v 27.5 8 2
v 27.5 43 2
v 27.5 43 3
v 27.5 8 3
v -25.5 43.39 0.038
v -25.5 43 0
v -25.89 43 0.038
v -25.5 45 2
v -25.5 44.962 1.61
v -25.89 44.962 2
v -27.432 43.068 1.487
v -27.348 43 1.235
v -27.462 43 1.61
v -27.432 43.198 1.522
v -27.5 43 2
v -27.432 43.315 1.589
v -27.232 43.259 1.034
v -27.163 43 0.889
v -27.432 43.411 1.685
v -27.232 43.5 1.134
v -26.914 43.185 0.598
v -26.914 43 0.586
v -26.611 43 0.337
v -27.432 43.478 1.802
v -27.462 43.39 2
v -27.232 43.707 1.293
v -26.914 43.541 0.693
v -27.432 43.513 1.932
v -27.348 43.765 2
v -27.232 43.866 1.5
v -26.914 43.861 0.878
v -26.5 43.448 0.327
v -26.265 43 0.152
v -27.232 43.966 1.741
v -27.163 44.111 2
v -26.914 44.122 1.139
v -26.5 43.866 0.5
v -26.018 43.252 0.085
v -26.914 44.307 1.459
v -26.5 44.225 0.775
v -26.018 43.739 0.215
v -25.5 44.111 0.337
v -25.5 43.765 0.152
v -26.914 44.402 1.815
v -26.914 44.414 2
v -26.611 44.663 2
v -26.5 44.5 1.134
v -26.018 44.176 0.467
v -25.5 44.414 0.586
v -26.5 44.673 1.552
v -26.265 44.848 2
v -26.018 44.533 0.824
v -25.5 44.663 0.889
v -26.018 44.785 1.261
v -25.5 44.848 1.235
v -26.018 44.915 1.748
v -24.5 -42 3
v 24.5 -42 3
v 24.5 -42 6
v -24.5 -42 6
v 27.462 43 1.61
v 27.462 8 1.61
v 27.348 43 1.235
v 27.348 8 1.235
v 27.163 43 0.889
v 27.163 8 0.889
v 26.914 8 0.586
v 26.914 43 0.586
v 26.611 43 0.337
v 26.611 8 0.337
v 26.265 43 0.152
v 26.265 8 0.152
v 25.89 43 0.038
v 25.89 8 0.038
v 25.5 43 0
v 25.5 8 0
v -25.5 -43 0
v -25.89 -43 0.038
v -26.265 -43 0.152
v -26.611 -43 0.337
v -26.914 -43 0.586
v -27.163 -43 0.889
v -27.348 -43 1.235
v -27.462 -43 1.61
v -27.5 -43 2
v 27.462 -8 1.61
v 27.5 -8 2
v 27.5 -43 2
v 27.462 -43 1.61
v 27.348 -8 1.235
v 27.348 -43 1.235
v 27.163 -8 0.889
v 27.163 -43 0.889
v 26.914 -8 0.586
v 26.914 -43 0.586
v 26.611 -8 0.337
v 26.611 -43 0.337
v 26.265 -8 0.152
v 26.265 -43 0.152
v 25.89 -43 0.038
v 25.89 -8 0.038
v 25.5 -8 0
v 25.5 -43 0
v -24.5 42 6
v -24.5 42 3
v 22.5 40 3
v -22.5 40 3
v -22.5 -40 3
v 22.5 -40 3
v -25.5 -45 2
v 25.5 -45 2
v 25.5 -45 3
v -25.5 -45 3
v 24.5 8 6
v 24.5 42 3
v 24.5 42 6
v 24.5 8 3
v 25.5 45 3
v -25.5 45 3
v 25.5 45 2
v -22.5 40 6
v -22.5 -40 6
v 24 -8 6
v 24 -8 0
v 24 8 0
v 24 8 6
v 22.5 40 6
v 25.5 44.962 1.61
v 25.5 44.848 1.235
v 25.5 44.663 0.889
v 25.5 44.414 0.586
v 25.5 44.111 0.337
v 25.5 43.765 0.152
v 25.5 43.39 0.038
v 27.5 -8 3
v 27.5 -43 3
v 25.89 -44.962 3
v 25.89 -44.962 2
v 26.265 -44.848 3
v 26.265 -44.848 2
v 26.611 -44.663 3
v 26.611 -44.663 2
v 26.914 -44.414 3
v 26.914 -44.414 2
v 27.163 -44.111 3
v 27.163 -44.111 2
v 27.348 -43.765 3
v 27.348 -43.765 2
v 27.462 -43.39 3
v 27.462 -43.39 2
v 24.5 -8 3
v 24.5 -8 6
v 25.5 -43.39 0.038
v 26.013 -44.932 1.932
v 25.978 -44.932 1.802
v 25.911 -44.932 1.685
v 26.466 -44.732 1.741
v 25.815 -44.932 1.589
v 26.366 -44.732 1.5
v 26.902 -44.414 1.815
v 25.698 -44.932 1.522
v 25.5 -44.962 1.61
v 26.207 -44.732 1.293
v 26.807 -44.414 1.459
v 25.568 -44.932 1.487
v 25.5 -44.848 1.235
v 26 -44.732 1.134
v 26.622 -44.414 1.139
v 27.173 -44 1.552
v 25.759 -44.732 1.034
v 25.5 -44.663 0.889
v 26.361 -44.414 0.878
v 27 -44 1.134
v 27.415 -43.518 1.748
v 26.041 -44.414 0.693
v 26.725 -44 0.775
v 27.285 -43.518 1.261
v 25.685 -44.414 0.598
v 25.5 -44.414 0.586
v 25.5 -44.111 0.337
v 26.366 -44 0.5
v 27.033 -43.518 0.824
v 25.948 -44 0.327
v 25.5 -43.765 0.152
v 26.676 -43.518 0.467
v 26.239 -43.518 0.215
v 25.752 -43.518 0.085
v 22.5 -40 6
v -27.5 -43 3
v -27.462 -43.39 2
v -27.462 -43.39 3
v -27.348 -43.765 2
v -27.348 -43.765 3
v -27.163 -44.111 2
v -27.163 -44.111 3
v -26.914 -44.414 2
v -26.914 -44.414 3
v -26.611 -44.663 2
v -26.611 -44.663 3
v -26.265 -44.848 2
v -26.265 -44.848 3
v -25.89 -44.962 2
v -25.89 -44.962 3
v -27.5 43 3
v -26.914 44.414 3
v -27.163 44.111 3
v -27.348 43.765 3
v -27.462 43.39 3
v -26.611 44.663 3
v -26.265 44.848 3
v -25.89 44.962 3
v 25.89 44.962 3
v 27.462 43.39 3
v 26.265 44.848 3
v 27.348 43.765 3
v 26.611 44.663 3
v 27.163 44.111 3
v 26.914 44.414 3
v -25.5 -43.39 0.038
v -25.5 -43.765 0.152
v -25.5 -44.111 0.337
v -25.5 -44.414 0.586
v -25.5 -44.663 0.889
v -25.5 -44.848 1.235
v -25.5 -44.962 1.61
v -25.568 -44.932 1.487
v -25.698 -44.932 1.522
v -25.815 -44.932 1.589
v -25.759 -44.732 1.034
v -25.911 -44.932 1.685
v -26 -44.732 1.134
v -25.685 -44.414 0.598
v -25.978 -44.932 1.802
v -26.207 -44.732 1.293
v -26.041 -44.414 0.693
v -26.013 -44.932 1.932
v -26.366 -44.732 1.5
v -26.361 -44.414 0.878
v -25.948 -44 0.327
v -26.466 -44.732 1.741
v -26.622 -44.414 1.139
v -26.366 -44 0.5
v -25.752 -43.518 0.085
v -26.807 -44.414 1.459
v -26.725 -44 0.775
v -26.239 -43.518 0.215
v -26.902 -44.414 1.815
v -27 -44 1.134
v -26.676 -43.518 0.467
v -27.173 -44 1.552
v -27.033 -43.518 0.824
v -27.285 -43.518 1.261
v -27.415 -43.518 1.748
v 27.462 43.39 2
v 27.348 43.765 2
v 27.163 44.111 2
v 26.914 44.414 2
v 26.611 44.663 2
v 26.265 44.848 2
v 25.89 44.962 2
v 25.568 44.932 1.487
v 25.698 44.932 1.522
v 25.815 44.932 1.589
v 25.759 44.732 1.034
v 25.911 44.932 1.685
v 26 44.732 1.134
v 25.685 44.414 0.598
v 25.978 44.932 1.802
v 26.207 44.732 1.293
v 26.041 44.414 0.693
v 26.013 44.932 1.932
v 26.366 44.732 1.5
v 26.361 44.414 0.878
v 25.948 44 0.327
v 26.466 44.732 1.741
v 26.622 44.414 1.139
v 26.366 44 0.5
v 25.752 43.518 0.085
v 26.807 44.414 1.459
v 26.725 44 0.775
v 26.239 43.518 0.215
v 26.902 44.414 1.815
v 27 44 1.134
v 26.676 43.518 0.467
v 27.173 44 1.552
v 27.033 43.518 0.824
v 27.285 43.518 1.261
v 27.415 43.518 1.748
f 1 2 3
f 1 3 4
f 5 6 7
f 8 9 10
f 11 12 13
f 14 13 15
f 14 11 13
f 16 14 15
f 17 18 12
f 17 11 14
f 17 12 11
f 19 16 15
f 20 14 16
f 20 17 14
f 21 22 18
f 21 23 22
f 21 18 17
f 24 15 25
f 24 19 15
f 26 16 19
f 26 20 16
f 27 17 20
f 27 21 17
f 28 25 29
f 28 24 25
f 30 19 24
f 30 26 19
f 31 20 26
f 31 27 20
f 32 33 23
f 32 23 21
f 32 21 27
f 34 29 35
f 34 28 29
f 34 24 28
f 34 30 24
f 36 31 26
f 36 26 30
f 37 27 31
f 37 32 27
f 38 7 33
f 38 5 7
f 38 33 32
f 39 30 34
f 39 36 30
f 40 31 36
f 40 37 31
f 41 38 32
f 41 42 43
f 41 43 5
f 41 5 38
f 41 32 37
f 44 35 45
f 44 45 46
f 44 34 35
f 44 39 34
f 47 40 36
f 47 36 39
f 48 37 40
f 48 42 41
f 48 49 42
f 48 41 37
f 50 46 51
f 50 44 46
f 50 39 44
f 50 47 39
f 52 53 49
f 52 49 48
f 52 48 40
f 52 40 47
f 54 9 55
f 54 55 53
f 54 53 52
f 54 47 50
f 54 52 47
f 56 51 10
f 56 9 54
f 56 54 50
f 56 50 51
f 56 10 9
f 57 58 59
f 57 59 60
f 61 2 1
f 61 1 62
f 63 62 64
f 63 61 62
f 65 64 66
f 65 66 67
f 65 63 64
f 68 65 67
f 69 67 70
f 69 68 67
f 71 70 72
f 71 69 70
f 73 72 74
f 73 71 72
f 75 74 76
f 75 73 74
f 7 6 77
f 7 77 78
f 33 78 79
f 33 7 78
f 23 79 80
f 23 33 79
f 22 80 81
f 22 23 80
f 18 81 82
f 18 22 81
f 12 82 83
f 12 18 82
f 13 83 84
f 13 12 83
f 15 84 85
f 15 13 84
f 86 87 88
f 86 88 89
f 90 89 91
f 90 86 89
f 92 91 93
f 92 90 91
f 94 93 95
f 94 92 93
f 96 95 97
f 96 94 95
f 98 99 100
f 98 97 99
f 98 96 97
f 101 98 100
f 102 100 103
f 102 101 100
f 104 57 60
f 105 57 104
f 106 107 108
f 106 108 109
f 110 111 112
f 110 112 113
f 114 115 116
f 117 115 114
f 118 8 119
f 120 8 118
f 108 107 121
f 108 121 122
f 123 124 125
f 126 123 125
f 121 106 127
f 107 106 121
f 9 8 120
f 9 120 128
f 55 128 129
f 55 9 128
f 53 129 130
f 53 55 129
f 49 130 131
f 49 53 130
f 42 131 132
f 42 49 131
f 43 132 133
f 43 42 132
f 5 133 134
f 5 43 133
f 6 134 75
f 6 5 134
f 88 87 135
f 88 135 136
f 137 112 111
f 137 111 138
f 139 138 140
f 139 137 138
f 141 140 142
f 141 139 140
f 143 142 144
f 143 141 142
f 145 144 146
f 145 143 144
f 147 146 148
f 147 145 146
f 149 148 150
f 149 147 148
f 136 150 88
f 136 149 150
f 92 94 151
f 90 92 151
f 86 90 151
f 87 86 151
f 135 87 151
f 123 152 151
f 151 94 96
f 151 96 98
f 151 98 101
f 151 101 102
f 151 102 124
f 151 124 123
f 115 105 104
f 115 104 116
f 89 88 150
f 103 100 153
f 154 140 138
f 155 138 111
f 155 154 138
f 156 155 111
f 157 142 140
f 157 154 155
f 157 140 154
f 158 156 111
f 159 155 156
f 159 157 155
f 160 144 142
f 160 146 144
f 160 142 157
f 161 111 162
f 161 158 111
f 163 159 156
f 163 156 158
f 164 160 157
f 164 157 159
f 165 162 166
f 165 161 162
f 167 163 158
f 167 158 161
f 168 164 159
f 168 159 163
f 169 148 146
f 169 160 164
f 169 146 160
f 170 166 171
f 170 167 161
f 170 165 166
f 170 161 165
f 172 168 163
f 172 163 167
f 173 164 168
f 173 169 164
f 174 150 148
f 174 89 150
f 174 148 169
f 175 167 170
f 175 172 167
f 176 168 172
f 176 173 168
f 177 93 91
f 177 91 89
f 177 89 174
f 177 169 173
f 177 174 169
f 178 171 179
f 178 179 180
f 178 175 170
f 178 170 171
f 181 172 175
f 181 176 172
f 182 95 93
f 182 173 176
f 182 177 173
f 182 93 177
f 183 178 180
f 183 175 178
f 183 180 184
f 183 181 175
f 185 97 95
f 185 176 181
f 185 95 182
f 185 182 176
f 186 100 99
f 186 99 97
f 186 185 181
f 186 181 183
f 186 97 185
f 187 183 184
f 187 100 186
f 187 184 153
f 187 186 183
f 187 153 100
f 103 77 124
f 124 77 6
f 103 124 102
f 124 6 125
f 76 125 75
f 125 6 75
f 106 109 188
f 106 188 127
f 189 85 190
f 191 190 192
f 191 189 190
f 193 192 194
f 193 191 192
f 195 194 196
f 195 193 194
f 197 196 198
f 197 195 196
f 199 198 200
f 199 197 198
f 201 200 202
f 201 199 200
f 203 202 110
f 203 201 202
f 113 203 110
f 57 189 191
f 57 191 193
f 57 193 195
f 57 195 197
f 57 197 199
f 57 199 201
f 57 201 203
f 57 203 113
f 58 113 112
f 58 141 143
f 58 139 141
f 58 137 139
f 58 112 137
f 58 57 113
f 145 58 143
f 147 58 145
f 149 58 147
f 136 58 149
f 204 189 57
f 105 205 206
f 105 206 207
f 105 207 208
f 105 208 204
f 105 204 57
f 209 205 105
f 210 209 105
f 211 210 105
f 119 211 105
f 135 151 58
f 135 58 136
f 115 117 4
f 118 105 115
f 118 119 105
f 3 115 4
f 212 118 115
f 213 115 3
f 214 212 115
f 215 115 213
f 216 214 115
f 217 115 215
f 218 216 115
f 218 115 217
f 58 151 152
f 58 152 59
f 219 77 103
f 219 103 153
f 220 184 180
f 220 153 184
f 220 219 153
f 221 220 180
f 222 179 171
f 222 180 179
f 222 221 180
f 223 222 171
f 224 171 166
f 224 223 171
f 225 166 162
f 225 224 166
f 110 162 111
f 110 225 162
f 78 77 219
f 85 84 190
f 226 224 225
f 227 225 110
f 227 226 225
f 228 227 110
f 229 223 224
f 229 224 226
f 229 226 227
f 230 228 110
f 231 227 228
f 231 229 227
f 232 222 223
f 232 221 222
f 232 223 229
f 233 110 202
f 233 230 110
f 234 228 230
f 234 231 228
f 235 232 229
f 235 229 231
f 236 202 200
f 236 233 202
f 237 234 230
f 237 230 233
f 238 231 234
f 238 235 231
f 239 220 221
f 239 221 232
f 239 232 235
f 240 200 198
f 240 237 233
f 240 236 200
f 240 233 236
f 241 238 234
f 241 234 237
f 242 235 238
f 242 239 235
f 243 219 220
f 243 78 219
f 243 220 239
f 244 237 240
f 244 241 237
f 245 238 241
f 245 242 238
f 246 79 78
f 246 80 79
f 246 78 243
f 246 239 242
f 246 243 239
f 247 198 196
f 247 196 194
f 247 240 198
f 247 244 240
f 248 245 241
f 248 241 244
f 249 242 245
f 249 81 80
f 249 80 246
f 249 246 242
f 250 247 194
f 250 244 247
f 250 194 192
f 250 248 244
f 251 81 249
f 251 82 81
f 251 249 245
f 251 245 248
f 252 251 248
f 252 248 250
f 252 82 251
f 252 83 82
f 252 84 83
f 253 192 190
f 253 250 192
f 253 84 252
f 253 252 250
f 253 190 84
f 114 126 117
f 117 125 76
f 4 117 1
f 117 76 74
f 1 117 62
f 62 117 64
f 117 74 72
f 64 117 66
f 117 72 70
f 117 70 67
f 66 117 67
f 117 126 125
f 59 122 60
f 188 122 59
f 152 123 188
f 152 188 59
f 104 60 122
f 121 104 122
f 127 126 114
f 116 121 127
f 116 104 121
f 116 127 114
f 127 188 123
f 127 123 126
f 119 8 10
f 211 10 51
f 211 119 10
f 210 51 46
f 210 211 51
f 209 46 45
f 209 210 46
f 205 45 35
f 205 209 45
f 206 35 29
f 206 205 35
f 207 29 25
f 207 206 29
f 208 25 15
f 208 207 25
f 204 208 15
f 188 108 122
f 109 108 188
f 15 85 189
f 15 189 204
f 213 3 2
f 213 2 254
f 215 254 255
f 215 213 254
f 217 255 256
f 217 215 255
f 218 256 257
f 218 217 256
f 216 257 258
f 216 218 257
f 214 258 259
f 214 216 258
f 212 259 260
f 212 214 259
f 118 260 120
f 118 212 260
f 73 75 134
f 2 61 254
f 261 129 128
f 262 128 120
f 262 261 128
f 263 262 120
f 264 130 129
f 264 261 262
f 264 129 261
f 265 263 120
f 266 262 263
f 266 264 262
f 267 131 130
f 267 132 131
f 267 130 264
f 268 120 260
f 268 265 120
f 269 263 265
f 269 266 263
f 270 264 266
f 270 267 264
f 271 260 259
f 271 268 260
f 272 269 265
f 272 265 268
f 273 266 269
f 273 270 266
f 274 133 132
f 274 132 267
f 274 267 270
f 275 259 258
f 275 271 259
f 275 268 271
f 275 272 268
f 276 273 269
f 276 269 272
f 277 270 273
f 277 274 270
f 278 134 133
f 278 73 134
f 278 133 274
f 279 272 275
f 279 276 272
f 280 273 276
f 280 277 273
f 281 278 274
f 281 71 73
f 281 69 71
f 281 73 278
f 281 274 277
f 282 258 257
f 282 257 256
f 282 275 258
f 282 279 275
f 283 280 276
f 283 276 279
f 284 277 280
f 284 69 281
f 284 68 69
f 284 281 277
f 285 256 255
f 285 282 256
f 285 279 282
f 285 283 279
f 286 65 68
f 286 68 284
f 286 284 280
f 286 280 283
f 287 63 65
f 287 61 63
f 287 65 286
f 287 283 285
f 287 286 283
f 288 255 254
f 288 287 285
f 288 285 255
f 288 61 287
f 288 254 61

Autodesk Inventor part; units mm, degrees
ref_plane "YZ Plane" through (0, 0, 0) normal (1, 0, 0) x (0, 1, 0)
ref_plane "XZ Plane" through (0, 0, 0) normal (0, 1, 0) x (-1, 0, 0)
ref_plane "XY Plane" through (0, 0, 0) normal (0, 0, 1) x (1, 0, 0)
sketch "Náčrt1" plane through (0, 0, 0) normal (0, 0, 1) x (1, 0, 0)
  line L0 (0, 63) -> (0, -63) projected
  line L1 (-38.5, 0) -> (38.5, 0) projected
  line L2 (27.5, -45) -> (-27.5, -45)
  line L3 (-27.5, -45) -> (-27.5, 45)
  line L4 (-27.5, 45) -> (27.5, 45)
  line L5 (27.5, 45) -> (27.5, -45)
  point P0 (0, 0)
  dimension "d0" = 55
  dimension "d1" = 90
extrude "Vysunutí1" add sketch "Náčrt1" along normal blind 3
sketch "Náčrt2" plane through (0, 0, 3) normal (0, 0, 1) x (1, 0, 0)
  line L0 (27.5, 45) -> (-27.5, 45) projected
  line L1 (-27.5, 45) -> (-27.5, -45) projected
  line L2 (-27.5, -45) -> (27.5, -45) projected
  line L3 (27.5, -45) -> (27.5, 45) projected
  line L4 (-27.5, 45) -> (-27.5, -45) projected
  line L5 (0, 63) -> (0, -63) projected
  line L6 (-38.5, 0) -> (38.5, 0) projected
  line L7 (24.5, -42) -> (-24.5, -42)
  line L8 (-24.5, -42) -> (-24.5, 42)
  line L9 (-24.5, 42) -> (24.5, 42)
  line L10 (24.5, 42) -> (24.5, -42)
  line L11 (-22.5, 40) -> (-22.5, -40)
  line L12 (-22.5, -40) -> (22.5, -40)
  line L13 (22.5, -40) -> (22.5, 40)
  line L14 (22.5, 40) -> (-22.5, 40)
  line L15 (-22.5, 0) -> (-24.5, 0)
  line L16 (-24.5, 0) -> (-24.5, -42)
  line L17 (-24.5, -42) -> (-22.5, -42)
  line L18 (-22.5, -42) -> (-22.5, 0)
  line L19 (22.5, 0) -> (24.5, 0)
  line L20 (24.5, 0) -> (24.5, -42)
  line L21 (24.5, -42) -> (22.5, -42)
  line L22 (22.5, -42) -> (22.5, 0)
  line L23 (24.5, -42) -> (-22.5, -42)
  line L24 (-22.5, -42) -> (-22.5, -40)
  line L25 (-22.5, -40) -> (24.5, -40)
  line L26 (24.5, -40) -> (24.5, -42)
  line L27 (-24.5, -42) -> (-22.5, -42)
  line L28 (-22.5, -42) -> (-22.5, -40)
  line L29 (-22.5, -40) -> (-24.5, -40)
  line L30 (-24.5, -40) -> (-24.5, -42)
  point P0 (0, 0)
  point P1 (24.5, 0)
  dimension "d8" = 49
  dimension "d9" = 84
  dimension "d10" = 2
extrude "Vysunutí2" add sketch "Náčrt2" along normal blind 3 contours L9 L10 L6 L13 L14 L5 | L5 L14 L11 L6 L8 L9 | L10 L25 L13 L6 | L10 L7 L22 L25 | L6 L11 L29 L8 | L7 L18 L12 L5 | L5 L12 L22 L7 | L29 L18 L7 L8
sketch "Náčrt3" plane through (0, 0, 0) normal (0, 0, -1) x (-1, 0, 0)
  line L0 (-27.5, 45) -> (27.5, 45) projected
  line L1 (-27.5, -45) -> (-27.5, 45) projected
  line L2 (27.5, -45) -> (-27.5, -45) projected
  line L3 (27.5, 45) -> (27.5, -45) projected
  line L4 (-27.5, -8) -> (-24, -8)
  line L5 (-24, -8) -> (-24, 8)
  line L6 (-24, 8) -> (-27.5, 8)
  line L7 (-27.5, 8) -> (-27.5, -8)
  line L8 (0, -63) -> (0, 63) projected
  line L9 (-38.5, 0) -> (38.5, 0) projected
  point P0 (0, 0)
  point P1 (-27.5, 8)
  dimension "d13" = 3.5
  dimension "d14" = 16
extrude "Vysunutí3" cut sketch "Náčrt3" against normal through all contours L6 L5 L9 L1 | L9 L5 L4 L1
fillet "Zaoblení1" radius 2 9 edges at (27.5, 26.5, 0) (0, 45, 0) (27.5, 45, 1.5) (-27.5, 45, 1.5) (-27.5, 0, 0) (27.5, -26.5, 0) (0, -45, 0) (27.5, -45, 1.5) (-27.5, -45, 1.5)
properties part number "adapter_box_lid_3D tisk"
